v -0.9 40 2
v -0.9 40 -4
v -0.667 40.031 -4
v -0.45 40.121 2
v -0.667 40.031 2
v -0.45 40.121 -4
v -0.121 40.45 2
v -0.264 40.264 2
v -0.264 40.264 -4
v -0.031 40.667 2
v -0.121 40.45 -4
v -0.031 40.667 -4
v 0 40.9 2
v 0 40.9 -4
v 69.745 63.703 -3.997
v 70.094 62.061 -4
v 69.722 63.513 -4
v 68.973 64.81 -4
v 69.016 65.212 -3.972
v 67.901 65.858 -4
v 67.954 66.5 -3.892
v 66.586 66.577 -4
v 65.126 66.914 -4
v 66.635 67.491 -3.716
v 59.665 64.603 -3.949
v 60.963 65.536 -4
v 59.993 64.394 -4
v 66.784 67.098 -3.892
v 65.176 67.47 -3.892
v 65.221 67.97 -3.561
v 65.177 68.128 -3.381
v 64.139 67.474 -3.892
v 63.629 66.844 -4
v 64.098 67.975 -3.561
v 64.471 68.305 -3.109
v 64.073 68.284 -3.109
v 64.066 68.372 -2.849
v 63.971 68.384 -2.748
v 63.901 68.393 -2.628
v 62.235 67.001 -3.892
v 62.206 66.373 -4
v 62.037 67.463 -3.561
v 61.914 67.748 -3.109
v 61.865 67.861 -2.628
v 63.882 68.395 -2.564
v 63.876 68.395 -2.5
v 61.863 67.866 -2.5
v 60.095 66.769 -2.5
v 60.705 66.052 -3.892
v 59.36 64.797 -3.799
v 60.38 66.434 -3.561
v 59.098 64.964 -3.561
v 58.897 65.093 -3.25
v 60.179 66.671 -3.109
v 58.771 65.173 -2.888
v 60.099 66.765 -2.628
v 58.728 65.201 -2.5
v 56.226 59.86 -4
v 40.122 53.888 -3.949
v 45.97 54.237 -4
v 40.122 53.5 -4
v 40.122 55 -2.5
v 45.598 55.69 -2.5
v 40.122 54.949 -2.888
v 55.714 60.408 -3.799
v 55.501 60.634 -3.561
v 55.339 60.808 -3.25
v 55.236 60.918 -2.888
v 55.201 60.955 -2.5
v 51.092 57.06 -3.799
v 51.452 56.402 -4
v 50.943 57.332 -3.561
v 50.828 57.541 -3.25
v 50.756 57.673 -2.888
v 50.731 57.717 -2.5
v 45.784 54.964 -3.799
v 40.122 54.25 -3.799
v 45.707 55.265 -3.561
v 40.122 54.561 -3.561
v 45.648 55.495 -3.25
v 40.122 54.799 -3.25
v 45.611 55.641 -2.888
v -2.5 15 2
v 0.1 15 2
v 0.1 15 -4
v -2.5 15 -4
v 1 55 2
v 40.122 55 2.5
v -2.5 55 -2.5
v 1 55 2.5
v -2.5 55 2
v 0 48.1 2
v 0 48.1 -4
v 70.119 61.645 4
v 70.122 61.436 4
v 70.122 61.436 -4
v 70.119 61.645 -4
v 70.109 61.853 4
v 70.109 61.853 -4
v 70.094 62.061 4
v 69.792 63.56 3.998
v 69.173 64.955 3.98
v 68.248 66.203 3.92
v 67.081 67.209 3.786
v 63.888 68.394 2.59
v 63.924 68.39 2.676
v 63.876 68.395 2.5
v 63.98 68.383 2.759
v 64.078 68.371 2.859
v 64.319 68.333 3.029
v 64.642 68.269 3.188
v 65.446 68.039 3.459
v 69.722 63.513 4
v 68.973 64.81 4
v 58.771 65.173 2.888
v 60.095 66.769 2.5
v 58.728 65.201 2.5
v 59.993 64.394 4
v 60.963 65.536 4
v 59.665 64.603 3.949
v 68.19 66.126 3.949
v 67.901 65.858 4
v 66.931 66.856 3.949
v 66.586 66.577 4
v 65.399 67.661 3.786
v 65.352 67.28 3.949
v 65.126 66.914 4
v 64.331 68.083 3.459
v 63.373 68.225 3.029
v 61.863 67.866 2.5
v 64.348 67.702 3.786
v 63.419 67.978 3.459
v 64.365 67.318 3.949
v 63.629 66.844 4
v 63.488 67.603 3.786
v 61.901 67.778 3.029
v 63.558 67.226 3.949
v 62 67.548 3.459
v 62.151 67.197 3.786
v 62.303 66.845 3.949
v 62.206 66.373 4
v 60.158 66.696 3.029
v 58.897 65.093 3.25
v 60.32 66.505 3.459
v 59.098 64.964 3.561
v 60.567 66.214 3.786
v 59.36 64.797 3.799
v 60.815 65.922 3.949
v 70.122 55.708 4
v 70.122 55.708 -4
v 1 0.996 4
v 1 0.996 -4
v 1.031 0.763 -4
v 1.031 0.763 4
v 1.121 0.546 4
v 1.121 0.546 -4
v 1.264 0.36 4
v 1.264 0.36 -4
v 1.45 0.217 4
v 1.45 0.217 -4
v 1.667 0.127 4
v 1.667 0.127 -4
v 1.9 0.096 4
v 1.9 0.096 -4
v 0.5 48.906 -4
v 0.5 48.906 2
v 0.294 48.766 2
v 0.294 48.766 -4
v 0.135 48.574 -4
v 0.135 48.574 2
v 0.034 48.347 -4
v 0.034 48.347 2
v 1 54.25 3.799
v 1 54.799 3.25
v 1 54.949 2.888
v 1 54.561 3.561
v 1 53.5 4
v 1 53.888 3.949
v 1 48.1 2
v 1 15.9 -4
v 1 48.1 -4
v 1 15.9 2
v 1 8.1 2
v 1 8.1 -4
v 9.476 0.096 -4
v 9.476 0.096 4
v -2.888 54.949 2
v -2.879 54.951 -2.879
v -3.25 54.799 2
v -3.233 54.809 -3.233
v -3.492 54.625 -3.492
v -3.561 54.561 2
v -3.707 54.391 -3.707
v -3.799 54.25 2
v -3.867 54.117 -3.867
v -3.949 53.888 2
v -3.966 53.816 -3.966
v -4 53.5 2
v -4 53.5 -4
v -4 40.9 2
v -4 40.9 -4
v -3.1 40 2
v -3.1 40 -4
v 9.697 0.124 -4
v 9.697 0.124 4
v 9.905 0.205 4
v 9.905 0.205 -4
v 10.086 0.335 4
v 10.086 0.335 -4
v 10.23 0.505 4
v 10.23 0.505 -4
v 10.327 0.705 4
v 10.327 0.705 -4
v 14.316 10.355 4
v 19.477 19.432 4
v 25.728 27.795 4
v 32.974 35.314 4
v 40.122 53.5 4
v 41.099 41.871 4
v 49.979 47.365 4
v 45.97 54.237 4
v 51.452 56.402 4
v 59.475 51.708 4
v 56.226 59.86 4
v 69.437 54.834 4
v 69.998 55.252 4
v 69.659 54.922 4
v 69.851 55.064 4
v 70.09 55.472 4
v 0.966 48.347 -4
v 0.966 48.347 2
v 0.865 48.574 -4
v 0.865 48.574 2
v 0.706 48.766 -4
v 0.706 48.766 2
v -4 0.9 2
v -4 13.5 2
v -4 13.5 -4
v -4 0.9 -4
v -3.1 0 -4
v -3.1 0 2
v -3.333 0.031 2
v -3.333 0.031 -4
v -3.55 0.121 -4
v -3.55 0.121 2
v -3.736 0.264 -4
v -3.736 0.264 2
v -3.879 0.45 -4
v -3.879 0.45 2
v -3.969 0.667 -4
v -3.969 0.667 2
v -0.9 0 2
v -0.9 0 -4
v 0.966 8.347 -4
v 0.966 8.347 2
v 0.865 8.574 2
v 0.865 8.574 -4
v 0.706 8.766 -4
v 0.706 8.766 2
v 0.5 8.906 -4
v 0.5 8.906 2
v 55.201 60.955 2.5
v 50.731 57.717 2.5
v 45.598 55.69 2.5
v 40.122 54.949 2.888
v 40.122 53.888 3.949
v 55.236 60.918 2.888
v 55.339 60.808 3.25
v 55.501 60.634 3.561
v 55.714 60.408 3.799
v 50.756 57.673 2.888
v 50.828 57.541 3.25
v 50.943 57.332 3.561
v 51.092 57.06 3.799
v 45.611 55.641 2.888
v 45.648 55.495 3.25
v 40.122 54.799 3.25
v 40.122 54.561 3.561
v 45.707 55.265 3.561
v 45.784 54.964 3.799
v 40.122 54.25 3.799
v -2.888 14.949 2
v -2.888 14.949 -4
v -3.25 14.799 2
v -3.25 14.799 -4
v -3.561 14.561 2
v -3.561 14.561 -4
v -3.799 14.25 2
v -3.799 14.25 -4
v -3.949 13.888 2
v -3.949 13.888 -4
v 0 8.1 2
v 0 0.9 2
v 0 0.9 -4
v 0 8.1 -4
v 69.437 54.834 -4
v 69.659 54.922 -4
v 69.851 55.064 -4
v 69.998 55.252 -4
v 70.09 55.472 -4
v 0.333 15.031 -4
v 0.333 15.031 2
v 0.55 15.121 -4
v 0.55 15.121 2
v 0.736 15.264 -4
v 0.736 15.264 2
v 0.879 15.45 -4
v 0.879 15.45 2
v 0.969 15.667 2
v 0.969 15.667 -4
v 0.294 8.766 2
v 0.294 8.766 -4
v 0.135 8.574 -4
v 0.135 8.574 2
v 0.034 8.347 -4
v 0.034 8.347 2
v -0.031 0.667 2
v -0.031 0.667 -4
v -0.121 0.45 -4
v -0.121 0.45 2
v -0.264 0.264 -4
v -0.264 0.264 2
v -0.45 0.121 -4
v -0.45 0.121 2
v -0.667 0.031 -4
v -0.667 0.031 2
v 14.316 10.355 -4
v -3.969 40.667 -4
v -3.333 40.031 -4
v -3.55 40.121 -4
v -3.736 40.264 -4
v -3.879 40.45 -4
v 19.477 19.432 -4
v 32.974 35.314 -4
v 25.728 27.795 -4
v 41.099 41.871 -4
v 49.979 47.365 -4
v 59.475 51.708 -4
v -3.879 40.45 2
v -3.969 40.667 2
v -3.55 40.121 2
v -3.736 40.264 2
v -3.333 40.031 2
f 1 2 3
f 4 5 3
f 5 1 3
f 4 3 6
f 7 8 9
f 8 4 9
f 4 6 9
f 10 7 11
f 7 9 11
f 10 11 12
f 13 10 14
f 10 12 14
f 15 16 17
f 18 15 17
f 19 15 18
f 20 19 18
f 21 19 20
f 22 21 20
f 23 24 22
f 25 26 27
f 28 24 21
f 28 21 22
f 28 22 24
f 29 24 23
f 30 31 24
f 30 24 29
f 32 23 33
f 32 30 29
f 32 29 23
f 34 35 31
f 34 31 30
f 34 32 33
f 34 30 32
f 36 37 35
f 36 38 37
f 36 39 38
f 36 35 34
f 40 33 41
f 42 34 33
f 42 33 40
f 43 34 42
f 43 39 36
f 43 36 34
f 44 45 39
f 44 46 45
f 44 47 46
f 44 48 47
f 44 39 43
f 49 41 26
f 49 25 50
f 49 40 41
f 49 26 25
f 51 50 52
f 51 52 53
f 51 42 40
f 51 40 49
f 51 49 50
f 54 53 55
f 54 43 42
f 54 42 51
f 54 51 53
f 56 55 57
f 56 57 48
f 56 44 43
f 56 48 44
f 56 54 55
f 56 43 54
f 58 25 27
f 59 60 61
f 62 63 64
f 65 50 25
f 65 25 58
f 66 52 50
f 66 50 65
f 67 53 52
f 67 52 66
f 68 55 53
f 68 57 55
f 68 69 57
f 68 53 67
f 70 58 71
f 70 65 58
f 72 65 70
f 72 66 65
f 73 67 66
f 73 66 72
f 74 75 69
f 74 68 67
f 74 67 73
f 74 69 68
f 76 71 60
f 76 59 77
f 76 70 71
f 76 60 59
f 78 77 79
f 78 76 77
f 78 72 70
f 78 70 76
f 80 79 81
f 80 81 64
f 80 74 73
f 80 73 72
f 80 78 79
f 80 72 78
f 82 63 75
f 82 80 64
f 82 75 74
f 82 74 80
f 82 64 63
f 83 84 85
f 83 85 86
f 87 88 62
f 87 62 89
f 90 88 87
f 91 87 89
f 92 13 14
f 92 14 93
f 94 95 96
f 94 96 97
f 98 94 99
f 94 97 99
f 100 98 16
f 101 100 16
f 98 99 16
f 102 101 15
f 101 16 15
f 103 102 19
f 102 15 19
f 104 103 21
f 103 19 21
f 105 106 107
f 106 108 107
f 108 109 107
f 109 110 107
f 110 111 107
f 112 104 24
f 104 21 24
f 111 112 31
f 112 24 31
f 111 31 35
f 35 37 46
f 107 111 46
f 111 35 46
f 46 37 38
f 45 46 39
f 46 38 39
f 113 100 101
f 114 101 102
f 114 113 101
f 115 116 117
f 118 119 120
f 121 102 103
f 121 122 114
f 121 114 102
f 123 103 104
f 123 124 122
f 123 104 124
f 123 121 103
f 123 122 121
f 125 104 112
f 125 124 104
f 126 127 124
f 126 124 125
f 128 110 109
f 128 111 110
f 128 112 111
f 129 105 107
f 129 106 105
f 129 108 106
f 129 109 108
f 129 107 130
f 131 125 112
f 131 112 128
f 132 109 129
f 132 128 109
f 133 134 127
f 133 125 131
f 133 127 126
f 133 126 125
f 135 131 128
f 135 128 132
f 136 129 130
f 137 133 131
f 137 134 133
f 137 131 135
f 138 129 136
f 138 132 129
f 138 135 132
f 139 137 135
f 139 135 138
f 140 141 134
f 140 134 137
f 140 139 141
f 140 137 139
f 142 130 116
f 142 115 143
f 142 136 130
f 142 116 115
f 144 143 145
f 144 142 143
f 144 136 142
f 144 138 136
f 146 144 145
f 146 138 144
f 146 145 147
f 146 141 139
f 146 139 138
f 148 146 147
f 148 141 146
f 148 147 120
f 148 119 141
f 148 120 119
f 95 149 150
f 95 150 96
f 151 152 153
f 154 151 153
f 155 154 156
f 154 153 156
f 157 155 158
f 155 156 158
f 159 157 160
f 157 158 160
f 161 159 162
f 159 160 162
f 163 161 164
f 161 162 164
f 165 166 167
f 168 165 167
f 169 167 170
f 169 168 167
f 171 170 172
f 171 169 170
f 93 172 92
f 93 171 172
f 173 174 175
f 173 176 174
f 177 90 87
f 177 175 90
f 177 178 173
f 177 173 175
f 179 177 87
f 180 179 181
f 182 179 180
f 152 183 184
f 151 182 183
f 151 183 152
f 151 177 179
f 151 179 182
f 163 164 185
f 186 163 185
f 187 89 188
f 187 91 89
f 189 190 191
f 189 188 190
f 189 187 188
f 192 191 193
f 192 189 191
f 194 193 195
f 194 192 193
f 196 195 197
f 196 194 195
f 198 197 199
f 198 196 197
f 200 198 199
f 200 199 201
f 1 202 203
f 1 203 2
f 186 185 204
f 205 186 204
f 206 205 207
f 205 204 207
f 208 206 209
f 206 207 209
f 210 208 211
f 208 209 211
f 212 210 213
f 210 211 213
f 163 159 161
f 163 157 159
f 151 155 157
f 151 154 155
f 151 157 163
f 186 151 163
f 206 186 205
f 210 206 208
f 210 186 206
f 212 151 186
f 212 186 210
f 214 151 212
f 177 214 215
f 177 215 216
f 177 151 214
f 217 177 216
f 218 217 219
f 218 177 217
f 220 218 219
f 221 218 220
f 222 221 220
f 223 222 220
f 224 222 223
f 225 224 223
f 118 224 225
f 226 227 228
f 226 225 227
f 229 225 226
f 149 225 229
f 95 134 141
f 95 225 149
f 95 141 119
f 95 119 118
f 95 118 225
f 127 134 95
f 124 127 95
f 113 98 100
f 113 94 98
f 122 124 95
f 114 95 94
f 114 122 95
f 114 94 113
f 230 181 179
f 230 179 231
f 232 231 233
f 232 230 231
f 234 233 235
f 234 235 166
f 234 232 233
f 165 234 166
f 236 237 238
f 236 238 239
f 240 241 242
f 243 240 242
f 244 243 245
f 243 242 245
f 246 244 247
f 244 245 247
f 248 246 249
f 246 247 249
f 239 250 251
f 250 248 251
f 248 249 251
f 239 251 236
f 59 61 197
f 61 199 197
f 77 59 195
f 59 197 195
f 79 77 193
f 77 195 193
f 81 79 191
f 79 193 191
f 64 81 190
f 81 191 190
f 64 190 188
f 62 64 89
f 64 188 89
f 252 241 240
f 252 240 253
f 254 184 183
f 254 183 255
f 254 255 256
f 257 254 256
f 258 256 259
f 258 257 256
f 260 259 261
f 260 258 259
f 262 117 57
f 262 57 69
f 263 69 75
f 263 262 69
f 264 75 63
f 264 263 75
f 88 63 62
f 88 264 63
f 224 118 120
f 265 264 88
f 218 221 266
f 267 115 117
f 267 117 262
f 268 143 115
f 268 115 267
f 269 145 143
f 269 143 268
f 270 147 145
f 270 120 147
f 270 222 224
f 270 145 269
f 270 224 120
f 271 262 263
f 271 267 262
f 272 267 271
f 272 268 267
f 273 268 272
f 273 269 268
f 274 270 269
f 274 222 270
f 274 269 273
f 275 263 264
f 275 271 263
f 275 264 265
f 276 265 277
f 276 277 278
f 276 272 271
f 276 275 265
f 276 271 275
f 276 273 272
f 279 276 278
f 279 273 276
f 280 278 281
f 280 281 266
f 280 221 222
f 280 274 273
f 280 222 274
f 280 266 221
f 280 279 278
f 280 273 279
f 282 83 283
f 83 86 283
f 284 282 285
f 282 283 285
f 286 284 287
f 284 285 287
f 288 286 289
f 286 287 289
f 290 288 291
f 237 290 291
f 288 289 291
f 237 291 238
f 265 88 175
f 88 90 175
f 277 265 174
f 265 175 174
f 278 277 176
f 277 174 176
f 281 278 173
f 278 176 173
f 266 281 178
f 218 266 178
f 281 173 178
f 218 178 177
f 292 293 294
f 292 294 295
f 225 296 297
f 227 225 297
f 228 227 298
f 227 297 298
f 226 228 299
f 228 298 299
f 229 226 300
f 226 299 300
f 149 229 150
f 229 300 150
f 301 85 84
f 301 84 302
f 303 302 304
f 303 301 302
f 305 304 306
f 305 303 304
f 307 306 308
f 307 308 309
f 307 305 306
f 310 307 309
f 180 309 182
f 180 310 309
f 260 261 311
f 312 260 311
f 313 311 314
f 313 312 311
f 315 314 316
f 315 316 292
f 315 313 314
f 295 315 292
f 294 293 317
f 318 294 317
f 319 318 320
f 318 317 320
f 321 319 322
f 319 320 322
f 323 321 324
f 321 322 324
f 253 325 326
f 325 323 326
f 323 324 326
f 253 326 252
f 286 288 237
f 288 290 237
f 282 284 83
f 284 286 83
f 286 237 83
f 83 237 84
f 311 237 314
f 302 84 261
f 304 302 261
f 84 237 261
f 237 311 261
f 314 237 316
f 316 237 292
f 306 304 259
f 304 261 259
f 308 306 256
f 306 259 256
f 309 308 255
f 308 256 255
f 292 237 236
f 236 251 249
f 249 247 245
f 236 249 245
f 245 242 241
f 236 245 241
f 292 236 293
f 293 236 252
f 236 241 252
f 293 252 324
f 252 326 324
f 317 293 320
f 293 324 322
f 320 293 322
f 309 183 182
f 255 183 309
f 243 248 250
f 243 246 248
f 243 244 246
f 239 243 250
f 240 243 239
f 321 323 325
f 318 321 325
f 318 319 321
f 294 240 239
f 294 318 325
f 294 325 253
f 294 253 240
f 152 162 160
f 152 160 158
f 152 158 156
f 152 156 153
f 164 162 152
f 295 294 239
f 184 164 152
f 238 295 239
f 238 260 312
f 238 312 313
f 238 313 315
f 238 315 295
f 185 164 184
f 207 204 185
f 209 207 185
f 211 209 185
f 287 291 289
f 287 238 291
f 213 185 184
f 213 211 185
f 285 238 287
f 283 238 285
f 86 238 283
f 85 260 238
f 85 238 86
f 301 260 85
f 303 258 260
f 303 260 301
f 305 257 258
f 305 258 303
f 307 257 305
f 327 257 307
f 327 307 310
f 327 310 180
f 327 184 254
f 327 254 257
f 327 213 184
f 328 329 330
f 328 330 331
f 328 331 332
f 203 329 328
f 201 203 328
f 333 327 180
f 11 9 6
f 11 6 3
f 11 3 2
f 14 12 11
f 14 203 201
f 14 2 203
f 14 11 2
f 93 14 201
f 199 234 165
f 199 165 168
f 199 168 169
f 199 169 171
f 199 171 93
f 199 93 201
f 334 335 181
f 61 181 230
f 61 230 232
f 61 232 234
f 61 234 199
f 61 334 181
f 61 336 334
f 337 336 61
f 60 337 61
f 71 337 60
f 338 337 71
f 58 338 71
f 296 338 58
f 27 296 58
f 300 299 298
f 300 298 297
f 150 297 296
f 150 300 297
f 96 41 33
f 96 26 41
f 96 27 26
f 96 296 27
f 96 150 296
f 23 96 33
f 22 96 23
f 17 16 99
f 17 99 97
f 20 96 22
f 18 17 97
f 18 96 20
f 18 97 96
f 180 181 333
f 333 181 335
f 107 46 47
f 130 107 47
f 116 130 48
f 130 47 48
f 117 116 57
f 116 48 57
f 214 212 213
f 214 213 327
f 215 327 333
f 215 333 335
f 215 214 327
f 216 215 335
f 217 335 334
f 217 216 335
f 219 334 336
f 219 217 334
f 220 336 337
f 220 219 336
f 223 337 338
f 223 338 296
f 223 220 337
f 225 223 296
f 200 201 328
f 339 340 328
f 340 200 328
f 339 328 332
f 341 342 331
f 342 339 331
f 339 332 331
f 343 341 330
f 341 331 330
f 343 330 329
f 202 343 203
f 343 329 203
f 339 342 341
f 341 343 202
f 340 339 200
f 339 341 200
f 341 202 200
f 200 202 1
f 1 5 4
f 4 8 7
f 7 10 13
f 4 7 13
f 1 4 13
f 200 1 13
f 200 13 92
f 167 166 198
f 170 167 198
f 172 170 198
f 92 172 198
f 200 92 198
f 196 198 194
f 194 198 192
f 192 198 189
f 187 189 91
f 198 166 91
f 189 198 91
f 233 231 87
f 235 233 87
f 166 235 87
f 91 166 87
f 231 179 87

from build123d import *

# Parameters (mm, degrees)
BOSS_EXTRU_1_DEPTH      = 4
ENL_V_MAT_EXTRU_1_DEPTH = 2
CONG_4_R                = 7
CONG_3_R                = 0.9
CONG_5_R                = 1.5


with BuildPart() as part:
    # Esquisse1 → Boss.-Extru.1 (new, symmetric)
    with BuildSketch(Plane.XY):
        with BuildLine():
            Line((0, 0), (0, 9))
            Line((0, 9), (1, 9))
            Line((1, 9), (1, 0.09638948))
            Line((1, 0.09638948), (10.121873618, 0.09638948))
            ThreePointArc((10.121873618, 0.09638948), (32.996323667, 35.335168912), (70.121873618, 55))
            Line((70.121873618, 55), (70.121873618, 68.436194763))
            Line((70.121873618, 68.436194763), (60.432430442, 68.436194763))
            ThreePointArc((60.432430442, 68.436194763), (52.298183077, 58.663045958), (40.121873618, 55))
            Line((40.121873618, 55), (19.293191489, 55))
            Line((19.293191489, 55), (10.121873618, 55))
            Line((10.121873618, 55), (-4, 55))
            Line((-4, 55), (-4, 40))
            Line((-4, 40), (0, 40))
            Line((0, 40), (0, 49))
            Line((0, 49), (1, 49))
            Line((1, 49), (1, 15))
            Line((1, 15), (-4, 15))
            Line((-4, 15), (-4, 0))
            Line((-4, 0), (0, 0))
        make_face()
    extrude(amount=BOSS_EXTRU_1_DEPTH, both=True)

    # Esquisse4 → Enlèv. mat.-Extru.1 (cut)
    with BuildSketch(Plane.XY.offset(4)):
        Polygon((0, 40), (-4, 40), (-4, 55), (1, 55), (1, 40), align=None)
        Polygon((0, 0), (-4, 0), (-4, 15), (1, 15), (1, 0), align=None)
    extrude(amount=-ENL_V_MAT_EXTRU_1_DEPTH, mode=Mode.SUBTRACT)

    # Congé4
    # the kernel refuses this fillet: 7 mm, written as the material it takes off along each edge
    with BuildSketch(Plane(origin=(70.121873618, 68.436194763, -21.5), x_dir=(-1, 0, 0), z_dir=(0, 0, 1))) as cong_4_piece_1:
        with BuildLine():
            CenterArc((CONG_4_R, CONG_4_R), CONG_4_R, 180, 90)
            Line((0, CONG_4_R), (0, 0))
            Line((0, 0), (CONG_4_R, 0))
        make_face()
    extrude(amount=43, mode=Mode.SUBTRACT)
    with BuildSketch(Plane(origin=(60.432430442, 68.436194763, -14.492760312), x_dir=(-0.46608321311989886, -0.8847408877450115, 0), z_dir=(0, 0, 1))) as cong_4_piece_2:
        with BuildLine():
            CenterArc((4.236986438, 6.975932121), CONG_4_R, 207.780348291, 57.467043301)
            Line((-1.956199776, 3.713349629), (0, 0))
            ThreePointArc((0, 0), (1.828505702, 0.075879566), (3.657011403, 0))
        make_face()
    extrude(amount=28.985520624, mode=Mode.SUBTRACT)

    # Congé3
    # the kernel refuses this fillet: 0.9 mm, written as the material it adds along each edge
    with BuildSketch(Plane(origin=(1, 9, -4), x_dir=(-1, 0, 0), z_dir=(0, 0, 1)), Plane(origin=(0, 9, -4), x_dir=(0, -1, 0), z_dir=(0, 0, 1)), Plane(origin=(1, 15, -4), x_dir=(0, 1, 0), z_dir=(0, 0, 1))) as cong_3_piece_1:
        with BuildLine():
            CenterArc((CONG_3_R, CONG_3_R), CONG_3_R, 180, 90)
            Line((0, CONG_3_R), (0, 0))
            Line((0, 0), (CONG_3_R, 0))
        make_face()
    extrude(amount=6)
    with BuildSketch(Plane(origin=(1, 49, -4), x_dir=(0, -1, 0), z_dir=(0, 0, 1)), Plane(origin=(0, 49, -4), x_dir=(1, 0, 0), z_dir=(0, 0, 1))) as cong_3_piece_2:
        with BuildLine():
            CenterArc((CONG_3_R, -CONG_3_R), CONG_3_R, 90, 90)
            Line((0, -CONG_3_R), (0, 0))
            Line((0, 0), (CONG_3_R, 0))
        make_face()
    extrude(amount=6)
    # the kernel refuses this fillet: 0.9 mm, written as the material it takes off along each edge
    with BuildSketch(Plane(origin=(1, 0.09638948, -6.25), x_dir=(0, 1, 0), z_dir=(0, 0, 1))) as cong_3_2_piece_1:
        with BuildLine():
            CenterArc((CONG_3_R, -CONG_3_R), CONG_3_R, 90, 90)
            Line((0, -CONG_3_R), (0, 0))
            Line((0, 0), (CONG_3_R, 0))
        make_face()
    extrude(amount=12.5, mode=Mode.SUBTRACT)
    with BuildSketch(Plane(origin=(0, 0, 4.25), x_dir=(0, 1, 0), z_dir=(0, 0, -1)), Plane(origin=(-4, 0, 4.25), x_dir=(1, 0, 0), z_dir=(0, 0, -1))) as cong_3_2_piece_2:
        with BuildLine():
            CenterArc((CONG_3_R, -CONG_3_R), CONG_3_R, 90, 90)
            Line((0, -CONG_3_R), (0, 0))
            Line((0, 0), (CONG_3_R, 0))
        make_face()
    extrude(amount=10.5, mode=Mode.SUBTRACT)
    with BuildSketch(Plane(origin=(0, 40, -6.25), x_dir=(0, 1, 0), z_dir=(0, 0, 1)), Plane(origin=(-4, 40, -6.25), x_dir=(1, 0, 0), z_dir=(0, 0, 1))) as cong_3_2_piece_3:
        with BuildLine():
            CenterArc((CONG_3_R, CONG_3_R), CONG_3_R, 180, 90)
            Line((0, CONG_3_R), (0, 0))
            Line((0, 0), (CONG_3_R, 0))
        make_face()
    extrude(amount=10.5, mode=Mode.SUBTRACT)
    with BuildSketch(Plane(origin=(70.121873618, 55, -5.770556853), x_dir=(-0.9719612569458899, -0.2351410534044747, 0), z_dir=(0, 0, 1))) as cong_3_2_piece_4:
        with BuildLine():
            CenterArc((0.70823289, -0.899992014), CONG_3_R, 90.241370438, 76.15869203)
            Line((-0.166532241, -0.688365066), (0, 0))
            ThreePointArc((0, 0), (0.352220732, -0.000741903), (0.704441463, 0))
        make_face()
    extrude(amount=11.541113707, mode=Mode.SUBTRACT)
    with BuildSketch(Plane(origin=(10.121873618, 0.09638948, -5.615046517), x_dir=(-1, 0, 0), z_dir=(0, 0, 1))) as cong_3_2_piece_5:
        with BuildLine():
            CenterArc((0.646018607, -0.9), CONG_3_R, 90, 71.121872084)
            ThreePointArc((-0.205569441, -0.608799388), (-0.102199862, -0.304597179), (0, 0))
            Line((0, 0), (0.646018607, 0))
        make_face()
    extrude(amount=11.230093034, mode=Mode.SUBTRACT)

    # Congé5
    cong_5_edges = [part.edges().sort_by_distance(p)[0] for p in [
        (50.731308414, 57.717480203, -4),
        (60.938289065, 67.383858728, -4),
        (50.731308414, 57.717480203, 4),
        (60.938289065, 67.383858728, 4),
        (18.060936809, 55, -4),
        (20.560936809, 55, 4),
        (-4, 15, -1),
        (-4, 55, -1),
    ]]
    fillet(cong_5_edges, radius=CONG_5_R)


solid = part.part
